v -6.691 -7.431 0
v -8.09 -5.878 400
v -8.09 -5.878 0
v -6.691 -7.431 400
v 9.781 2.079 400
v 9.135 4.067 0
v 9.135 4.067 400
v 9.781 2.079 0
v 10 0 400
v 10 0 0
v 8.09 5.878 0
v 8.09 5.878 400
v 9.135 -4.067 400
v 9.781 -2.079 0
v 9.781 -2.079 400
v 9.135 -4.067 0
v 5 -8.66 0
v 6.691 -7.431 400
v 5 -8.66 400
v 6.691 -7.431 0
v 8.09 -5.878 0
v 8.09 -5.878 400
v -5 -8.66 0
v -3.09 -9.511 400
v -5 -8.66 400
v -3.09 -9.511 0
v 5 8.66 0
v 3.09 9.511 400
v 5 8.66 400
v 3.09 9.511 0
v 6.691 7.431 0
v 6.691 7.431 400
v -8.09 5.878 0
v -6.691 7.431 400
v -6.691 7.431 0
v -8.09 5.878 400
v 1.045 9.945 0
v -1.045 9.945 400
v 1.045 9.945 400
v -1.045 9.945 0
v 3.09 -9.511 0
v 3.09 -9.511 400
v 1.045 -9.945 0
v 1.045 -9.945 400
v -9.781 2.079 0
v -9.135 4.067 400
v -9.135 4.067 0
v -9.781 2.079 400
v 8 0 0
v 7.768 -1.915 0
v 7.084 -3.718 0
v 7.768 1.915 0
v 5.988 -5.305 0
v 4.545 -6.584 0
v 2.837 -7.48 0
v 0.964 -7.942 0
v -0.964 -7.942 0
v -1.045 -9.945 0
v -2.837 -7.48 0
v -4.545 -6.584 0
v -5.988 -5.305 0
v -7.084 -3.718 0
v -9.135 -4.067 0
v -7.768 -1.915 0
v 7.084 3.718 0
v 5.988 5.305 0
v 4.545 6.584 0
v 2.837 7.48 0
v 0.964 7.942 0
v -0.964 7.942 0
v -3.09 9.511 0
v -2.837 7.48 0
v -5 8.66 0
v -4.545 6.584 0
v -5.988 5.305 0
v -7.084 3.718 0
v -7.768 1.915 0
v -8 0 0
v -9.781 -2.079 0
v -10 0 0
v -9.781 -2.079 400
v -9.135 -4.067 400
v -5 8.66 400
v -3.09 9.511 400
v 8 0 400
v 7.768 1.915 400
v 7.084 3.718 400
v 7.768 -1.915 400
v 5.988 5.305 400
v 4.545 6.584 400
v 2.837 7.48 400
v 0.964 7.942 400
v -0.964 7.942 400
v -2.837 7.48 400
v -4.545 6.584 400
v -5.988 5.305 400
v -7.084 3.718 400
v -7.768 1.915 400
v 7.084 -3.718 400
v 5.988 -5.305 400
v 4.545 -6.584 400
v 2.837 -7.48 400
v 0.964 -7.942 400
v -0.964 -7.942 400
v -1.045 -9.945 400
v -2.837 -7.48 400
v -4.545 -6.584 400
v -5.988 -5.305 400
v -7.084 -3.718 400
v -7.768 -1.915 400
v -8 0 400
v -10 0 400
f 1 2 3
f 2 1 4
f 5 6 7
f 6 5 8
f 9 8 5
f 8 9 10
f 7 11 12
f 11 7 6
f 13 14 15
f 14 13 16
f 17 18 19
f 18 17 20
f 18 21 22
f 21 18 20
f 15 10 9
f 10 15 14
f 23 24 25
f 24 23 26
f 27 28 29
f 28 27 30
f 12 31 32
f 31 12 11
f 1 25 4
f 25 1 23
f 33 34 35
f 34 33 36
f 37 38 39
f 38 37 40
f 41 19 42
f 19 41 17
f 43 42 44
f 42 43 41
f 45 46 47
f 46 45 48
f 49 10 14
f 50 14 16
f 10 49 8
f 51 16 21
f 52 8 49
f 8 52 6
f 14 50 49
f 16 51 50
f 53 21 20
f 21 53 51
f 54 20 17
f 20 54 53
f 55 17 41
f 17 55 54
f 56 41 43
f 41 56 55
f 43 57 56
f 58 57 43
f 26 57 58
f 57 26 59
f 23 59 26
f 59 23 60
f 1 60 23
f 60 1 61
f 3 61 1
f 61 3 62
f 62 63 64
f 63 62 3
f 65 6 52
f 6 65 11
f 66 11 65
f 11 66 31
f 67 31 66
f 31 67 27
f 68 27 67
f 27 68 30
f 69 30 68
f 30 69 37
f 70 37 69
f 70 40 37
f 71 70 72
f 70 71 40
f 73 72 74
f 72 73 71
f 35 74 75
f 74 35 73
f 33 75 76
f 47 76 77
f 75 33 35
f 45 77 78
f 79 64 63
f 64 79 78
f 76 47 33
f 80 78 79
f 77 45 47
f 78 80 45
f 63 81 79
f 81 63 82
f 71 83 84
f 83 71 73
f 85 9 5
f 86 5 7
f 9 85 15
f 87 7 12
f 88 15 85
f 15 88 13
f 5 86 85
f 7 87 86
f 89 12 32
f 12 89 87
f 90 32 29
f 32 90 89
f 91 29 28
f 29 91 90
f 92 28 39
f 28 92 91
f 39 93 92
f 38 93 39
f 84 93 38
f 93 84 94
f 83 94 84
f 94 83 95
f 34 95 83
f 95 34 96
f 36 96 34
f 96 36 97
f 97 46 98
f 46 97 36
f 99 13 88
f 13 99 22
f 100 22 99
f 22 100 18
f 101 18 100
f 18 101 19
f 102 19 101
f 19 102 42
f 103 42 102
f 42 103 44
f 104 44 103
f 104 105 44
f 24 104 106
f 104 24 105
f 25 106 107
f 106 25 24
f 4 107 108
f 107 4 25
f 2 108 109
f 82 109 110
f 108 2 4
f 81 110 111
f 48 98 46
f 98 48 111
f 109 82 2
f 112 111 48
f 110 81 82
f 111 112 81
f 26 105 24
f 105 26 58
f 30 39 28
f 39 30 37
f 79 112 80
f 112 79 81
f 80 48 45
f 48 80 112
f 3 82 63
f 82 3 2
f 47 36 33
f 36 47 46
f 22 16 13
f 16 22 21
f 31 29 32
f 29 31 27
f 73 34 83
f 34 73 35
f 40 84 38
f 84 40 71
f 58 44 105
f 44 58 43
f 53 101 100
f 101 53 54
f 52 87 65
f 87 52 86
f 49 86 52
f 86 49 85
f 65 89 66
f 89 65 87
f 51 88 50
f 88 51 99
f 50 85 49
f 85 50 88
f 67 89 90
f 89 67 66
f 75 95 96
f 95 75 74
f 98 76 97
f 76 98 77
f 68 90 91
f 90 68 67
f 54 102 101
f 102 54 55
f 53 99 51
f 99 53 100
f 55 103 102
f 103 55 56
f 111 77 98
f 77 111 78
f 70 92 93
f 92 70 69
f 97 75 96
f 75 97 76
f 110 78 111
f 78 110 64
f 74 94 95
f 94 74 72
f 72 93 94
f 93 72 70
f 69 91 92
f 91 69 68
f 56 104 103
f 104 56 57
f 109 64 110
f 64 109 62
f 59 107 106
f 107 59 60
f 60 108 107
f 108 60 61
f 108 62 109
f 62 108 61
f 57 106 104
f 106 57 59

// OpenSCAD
//a, b are the sides
//length is the length of the profile
//e is the thickness
//r is the external radius. Internal radius will be calculated for const thickness
module bar(a, b, length, r0=0)
{
    //cube([a,b,length], center=true);
    linear_extrude(height = length, center=true)
    {
        offset(r = r0)
        {
            square([a-2*r0, b-2*r0], center = true);
        }
    }
}

module squareProfile(a, b, length, e, r=0)
{
    difference()
    {
        bar(a, b, length, r);
        bar(a-2*e, b-2*e, length + 666, r-e);
    }
}

module roundProfile(r, length, e)
{
	difference()
	{
		cylinder(r = r, h = length);
		translate([0, 0, -333]) cylinder(r = r-e, h = length + 666);
	}
}


roundProfile(10, 400, 2);
// squareProfile (20, 100, 2, 1);
